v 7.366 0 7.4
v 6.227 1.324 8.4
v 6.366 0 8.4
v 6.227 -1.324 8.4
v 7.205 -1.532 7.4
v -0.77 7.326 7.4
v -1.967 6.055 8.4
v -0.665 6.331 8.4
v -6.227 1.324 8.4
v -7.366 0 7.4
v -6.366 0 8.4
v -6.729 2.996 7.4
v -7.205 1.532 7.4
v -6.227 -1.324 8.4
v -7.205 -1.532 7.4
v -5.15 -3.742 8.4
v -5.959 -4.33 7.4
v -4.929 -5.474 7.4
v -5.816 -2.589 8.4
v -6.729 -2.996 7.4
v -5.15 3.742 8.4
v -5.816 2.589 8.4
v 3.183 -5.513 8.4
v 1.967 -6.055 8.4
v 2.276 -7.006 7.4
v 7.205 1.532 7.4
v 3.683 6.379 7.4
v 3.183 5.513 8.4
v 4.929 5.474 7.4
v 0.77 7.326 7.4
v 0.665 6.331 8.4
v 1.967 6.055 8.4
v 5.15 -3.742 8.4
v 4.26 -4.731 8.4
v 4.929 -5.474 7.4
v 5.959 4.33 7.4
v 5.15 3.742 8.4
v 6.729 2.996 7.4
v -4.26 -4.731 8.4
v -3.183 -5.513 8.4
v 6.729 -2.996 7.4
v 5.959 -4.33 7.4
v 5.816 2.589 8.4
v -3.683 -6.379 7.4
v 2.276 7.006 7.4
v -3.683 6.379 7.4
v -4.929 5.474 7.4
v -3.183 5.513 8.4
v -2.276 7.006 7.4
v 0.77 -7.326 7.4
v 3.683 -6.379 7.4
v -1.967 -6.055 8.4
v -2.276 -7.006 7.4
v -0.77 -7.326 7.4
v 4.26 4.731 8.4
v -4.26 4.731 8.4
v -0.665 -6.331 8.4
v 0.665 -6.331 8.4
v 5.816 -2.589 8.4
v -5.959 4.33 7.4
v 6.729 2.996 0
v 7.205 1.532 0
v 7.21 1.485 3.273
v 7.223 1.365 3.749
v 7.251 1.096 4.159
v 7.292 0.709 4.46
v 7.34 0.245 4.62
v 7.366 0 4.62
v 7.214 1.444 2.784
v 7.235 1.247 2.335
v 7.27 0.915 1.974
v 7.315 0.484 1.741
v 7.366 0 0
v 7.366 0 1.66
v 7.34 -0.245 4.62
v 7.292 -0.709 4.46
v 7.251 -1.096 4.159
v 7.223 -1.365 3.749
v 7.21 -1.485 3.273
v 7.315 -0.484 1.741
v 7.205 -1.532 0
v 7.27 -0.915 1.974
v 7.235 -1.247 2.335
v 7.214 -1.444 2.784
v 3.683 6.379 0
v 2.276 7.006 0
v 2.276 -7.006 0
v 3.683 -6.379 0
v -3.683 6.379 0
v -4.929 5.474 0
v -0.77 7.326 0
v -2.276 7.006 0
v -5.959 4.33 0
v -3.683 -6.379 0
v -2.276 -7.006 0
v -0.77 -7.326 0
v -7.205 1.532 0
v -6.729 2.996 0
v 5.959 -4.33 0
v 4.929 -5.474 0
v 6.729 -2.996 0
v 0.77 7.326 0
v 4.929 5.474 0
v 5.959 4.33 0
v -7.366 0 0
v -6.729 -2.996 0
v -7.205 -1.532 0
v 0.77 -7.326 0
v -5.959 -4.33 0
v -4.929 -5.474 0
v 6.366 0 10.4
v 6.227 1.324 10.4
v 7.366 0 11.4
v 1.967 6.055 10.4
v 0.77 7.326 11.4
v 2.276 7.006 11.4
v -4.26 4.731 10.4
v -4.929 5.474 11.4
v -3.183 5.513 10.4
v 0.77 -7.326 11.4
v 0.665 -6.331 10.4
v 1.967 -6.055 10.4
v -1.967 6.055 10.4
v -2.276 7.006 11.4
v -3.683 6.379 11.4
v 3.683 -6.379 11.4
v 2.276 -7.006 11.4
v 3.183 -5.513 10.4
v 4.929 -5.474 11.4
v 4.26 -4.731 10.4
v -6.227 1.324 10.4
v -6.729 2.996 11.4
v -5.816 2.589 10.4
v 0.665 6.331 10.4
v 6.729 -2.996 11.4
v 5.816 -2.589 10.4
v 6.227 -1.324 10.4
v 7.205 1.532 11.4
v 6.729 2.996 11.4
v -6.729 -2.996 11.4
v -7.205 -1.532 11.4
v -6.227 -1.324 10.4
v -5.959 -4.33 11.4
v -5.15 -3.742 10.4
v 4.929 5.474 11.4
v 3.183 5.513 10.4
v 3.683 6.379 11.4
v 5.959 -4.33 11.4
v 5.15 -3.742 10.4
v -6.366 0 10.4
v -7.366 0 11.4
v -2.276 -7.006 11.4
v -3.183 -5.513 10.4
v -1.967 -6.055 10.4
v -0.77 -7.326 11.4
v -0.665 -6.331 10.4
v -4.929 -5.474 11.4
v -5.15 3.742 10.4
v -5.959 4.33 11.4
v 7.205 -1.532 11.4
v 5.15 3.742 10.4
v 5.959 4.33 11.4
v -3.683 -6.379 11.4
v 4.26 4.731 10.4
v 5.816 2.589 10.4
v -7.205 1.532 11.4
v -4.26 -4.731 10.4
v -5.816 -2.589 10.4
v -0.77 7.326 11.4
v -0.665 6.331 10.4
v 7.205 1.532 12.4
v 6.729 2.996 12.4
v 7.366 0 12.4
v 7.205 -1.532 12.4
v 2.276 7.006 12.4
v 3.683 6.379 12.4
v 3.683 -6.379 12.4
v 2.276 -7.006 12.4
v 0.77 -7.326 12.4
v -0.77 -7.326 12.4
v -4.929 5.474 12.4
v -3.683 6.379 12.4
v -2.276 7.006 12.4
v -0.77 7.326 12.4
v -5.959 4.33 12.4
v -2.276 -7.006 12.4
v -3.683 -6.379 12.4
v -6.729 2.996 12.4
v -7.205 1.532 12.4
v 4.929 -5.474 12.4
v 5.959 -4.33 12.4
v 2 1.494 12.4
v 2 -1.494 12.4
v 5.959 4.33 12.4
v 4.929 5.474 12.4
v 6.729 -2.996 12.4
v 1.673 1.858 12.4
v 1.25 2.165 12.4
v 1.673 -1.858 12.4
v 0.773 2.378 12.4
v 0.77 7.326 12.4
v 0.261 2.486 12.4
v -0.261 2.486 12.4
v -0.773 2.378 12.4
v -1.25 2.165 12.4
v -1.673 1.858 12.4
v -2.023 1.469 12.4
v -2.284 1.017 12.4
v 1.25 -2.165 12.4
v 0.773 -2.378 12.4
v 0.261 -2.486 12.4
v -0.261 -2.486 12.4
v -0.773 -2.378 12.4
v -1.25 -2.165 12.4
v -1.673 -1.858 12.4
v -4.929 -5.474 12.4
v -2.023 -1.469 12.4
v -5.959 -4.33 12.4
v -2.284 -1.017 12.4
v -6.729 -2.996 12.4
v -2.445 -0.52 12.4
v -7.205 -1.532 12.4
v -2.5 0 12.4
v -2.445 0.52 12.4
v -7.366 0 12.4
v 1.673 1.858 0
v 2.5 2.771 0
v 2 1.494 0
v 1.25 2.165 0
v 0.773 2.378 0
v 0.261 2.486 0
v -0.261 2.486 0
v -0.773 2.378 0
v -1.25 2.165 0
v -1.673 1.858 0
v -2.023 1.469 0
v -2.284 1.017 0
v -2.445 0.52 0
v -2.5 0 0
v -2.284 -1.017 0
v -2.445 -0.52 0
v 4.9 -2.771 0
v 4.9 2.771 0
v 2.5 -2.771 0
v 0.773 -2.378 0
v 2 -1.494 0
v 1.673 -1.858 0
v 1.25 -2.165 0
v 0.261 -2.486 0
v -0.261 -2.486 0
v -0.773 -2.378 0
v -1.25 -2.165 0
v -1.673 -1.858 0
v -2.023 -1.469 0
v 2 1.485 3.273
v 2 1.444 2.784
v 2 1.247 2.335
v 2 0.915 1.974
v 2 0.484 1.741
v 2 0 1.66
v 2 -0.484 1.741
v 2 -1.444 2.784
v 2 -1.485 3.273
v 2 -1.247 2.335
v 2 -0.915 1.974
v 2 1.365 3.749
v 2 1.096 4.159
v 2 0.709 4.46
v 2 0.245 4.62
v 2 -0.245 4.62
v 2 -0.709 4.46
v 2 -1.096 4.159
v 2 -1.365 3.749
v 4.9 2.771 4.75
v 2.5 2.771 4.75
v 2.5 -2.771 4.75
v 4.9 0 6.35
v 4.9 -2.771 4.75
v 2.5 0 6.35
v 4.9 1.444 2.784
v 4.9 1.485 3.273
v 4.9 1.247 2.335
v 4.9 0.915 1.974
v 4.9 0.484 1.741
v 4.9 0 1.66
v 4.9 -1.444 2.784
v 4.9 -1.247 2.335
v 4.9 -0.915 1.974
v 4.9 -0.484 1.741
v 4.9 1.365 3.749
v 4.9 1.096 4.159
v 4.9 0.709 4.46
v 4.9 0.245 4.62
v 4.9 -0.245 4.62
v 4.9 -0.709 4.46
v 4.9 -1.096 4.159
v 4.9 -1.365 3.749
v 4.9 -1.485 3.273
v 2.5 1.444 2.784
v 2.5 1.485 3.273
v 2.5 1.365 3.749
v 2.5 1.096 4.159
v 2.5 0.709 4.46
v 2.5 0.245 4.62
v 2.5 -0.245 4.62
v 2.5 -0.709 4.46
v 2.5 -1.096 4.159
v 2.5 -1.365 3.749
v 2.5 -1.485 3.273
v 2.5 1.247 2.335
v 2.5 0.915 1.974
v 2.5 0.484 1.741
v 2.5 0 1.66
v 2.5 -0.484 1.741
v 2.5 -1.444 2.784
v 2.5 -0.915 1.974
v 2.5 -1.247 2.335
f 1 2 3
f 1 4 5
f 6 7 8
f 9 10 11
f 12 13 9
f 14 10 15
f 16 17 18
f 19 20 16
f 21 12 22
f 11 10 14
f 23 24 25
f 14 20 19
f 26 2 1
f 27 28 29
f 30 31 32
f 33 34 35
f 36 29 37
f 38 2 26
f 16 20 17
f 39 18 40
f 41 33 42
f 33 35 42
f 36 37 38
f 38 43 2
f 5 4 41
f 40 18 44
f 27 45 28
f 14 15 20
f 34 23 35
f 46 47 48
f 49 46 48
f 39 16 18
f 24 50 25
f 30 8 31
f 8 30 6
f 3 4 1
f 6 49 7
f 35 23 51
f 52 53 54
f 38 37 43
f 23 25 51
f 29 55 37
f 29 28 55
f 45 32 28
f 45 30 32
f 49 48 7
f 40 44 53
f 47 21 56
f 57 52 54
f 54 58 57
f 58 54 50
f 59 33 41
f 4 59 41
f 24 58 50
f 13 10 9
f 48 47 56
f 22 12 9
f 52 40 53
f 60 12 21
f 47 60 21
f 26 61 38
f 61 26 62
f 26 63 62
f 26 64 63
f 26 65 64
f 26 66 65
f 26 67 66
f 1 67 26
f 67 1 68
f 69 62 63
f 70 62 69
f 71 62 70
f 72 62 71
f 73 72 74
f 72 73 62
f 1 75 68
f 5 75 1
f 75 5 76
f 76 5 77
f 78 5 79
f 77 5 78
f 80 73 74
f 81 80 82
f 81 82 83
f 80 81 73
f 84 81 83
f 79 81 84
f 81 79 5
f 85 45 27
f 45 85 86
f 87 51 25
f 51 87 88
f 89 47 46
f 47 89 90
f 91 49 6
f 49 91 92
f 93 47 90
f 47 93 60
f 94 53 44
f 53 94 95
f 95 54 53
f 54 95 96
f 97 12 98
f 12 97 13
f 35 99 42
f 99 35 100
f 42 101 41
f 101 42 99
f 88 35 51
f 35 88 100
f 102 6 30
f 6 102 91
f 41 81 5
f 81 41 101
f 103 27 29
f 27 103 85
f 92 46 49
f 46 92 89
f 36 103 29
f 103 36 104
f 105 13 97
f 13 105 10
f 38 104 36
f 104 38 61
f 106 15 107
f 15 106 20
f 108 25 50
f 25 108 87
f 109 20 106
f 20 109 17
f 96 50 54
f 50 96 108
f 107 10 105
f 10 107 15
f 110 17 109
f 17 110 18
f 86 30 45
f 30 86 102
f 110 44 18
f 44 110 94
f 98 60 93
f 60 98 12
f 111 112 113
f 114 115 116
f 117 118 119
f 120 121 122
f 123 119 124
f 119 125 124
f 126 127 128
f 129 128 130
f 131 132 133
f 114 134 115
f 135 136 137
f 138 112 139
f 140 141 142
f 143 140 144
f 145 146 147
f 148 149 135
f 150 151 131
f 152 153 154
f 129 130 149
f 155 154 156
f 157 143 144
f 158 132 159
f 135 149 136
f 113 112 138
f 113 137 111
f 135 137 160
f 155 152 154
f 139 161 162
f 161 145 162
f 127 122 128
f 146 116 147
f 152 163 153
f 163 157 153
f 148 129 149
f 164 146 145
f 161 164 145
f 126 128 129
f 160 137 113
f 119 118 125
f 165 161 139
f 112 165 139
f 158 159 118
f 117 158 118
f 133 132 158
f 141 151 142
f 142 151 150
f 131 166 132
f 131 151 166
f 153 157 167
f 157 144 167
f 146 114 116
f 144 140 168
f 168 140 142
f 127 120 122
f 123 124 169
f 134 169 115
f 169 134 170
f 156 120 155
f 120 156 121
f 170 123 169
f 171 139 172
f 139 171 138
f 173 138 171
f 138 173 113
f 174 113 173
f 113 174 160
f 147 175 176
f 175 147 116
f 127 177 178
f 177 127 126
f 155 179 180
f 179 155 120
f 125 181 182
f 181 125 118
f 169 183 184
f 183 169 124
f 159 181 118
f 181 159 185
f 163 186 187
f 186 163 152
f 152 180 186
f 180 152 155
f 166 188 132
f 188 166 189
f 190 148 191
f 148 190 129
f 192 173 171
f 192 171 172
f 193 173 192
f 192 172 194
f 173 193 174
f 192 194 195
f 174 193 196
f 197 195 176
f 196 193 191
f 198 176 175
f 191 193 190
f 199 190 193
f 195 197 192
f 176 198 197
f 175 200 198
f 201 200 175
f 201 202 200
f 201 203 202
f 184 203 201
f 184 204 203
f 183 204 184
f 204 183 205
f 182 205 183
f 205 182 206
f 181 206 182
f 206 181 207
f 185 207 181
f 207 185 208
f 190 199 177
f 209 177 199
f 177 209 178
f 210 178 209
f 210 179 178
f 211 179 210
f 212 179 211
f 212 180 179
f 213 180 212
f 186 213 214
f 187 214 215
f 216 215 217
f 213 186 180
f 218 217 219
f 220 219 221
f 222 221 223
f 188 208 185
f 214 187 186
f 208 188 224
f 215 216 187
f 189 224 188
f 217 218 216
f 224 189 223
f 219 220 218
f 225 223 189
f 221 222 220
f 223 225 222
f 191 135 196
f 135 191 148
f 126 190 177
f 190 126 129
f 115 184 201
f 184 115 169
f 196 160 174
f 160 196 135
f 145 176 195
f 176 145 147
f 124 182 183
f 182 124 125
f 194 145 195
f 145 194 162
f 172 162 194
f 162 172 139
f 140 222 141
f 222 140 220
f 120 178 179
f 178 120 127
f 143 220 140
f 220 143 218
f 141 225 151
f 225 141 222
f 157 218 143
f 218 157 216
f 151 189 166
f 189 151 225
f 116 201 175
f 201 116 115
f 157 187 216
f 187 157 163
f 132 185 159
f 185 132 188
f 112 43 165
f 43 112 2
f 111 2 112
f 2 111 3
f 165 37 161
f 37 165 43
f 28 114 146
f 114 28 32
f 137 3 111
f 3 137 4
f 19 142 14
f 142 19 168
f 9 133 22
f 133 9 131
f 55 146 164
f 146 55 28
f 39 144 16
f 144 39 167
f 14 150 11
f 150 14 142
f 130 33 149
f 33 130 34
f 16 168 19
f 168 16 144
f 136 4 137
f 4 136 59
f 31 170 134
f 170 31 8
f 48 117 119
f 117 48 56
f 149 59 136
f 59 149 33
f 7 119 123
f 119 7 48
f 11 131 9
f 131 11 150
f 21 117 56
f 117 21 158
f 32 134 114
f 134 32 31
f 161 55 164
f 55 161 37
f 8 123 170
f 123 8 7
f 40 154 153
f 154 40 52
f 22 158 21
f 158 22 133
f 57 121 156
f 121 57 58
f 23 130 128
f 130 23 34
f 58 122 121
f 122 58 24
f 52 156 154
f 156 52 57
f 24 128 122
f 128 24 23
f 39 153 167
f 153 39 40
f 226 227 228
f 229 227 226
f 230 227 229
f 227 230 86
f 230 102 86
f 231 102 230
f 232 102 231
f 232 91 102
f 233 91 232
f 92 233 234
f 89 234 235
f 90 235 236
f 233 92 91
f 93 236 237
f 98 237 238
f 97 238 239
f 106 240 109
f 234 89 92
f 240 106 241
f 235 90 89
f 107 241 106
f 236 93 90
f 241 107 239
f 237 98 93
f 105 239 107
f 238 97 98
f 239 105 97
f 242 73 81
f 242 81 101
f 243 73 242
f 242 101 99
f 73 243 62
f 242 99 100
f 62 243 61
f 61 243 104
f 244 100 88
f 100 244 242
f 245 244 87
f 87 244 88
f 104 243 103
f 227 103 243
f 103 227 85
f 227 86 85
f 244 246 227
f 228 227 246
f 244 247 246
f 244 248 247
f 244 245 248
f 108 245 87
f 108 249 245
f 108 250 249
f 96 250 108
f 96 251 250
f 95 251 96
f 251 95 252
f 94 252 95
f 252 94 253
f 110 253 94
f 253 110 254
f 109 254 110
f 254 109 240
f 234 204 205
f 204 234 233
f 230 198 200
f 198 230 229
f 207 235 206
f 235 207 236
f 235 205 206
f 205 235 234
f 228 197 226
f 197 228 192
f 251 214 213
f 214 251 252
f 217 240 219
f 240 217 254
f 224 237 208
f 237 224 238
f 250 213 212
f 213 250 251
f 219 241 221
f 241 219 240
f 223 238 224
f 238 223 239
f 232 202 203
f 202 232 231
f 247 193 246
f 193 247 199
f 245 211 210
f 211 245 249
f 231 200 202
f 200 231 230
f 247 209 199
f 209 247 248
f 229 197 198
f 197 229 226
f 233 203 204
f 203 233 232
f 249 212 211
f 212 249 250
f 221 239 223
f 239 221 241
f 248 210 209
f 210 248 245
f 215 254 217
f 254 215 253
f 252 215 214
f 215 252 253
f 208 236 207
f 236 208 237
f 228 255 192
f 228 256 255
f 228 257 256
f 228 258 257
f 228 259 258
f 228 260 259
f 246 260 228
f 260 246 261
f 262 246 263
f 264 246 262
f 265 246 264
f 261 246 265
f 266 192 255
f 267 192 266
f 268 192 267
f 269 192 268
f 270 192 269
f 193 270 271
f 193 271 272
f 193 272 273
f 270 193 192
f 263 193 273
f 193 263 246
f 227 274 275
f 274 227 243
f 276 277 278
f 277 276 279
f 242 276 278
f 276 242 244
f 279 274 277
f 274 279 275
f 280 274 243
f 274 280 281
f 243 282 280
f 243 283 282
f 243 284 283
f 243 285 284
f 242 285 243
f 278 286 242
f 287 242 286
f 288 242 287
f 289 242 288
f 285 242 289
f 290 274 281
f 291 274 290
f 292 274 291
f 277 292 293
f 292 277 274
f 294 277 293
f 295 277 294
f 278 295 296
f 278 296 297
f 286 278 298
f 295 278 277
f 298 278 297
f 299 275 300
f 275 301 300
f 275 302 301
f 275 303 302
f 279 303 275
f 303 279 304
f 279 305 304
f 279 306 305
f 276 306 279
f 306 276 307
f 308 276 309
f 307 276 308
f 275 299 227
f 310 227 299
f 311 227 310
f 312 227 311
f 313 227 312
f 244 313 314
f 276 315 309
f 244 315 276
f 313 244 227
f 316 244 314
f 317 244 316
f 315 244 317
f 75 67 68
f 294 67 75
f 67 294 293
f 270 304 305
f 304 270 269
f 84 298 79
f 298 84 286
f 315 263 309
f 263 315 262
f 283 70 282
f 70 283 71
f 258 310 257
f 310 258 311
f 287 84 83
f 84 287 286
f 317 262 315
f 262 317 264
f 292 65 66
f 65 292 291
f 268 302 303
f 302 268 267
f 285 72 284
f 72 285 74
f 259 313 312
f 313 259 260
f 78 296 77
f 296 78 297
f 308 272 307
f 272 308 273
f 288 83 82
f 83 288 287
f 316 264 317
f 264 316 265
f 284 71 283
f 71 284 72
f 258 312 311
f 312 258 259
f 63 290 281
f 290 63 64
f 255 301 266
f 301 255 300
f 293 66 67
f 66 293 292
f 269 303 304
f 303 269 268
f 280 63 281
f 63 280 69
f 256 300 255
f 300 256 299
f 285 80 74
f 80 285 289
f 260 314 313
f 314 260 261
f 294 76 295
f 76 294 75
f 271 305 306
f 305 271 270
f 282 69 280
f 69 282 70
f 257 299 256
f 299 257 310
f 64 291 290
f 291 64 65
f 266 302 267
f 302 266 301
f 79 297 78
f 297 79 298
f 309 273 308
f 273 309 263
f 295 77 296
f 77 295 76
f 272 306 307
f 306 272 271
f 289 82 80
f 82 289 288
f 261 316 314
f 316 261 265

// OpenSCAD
// file: math.scad
// pulley
pulley_length = pulley_h+4*pulley_rivet+NUT_D[3];
pulley_diameter = pulley_d+pulley_rivet*2;
pulley_wire_height = pulley_h/2+pulley_rivet*2+NUT_D[3];
pulley_screw_length = (pulley_diameter-NEMA_S[17])/2;

//y
y_shaft_distance = NEMA_F[ab_motor]+y_s+y_shaft_distance_extra;

//
x_shaft_distance = y_shaft_distance-y_d-y_s;

//echo(x_shaft_distance);
// file: config.scad
include <standard.scad>


//render & print
$fs=.5;						//minimum arc segment
e=.1;						//extra length for manfold mesh (do not change)
tol=.5;						//xy compensation for small holes

wall=5/2;					//thin wall thickness

//frame
f_t=10;						//frame thickness
f_x=200;
f_y=200;
f_z=65;
f_tr=8;						//corner threaded rods ISO diameter 
fy_ko=2;					//keepout between frame and x_carriage

//microswitch
ms_h=6;						//height
ms_l=13;					//length
ms_t=6;						//thickness

//motors
ab_motor=17;				//xy motors
ab_motor_l=47;				//xy motors length
z_motor=17;					//z motor
z_motor_l=47;				//z motor length

//x
x_d=15;						//bearing diameter
x_l=24;						//bearing length
x_s=8;						//shaft diameter
x_fan=30;					//hotend fan diameter
x_blower=35;				//blower fan diameter
x_fans_m=6;					//fan and blower mount holes spacing

x_fan_duct=28;
x_blower_duct=25;
x_shroud=10;
x_shroud_t=5;
x_shroud_w=2;


//y
y_d=15;						//bearing diameter
y_l=24;						//bearing length
y_s=8;						//shaft diameter
y_shaft_distance_extra=3;	//extra distance between shafts
y_sp=6;						//shaft position (relative to frame)

//idler
idler_d=8;					//groove bearing OD
idler_l=3;					//groove bearing thickness
idler_s=3;					//groove bearing ID

idler_hk=2;					//idler horizontal keepout
idler_vk=.5;				//idler verical keepout (washer thickness?)

//pulley
pulley_d=200/PI/5;			//5 steps per mm (80 with 16x microstepping)
pulley_h=2;
pulley_rivet=1;
pulley_flat_shaft=true;

//hm (hotend mount)
//hm_sc_d=3+0.4*3*2;			//sliding cylinder diameter (optimized for 0.4mm nozzle)
hm_sc_d=NUT_D[3];


include <math.scad>
// file: standard.scad
BOLT_D = [
	-1, //0 index is not used but reduces computation
	-1,
	-1,
	2.980,	//m3
	3.978,	//m4
	4.976,	//m5
	5.974,	//m6
	-1,
	7.972,	//m8
	-1,
	9.968,	//m10
	-1,
	11.966	//m12
];

NUT_D = [
	-1, //0 index is not used but reduces computation
	-1,
	-1,
	6.40,	//m3
	8.10,	//m4
	9.20,	//m5
	11.50,	//m6
	-1,
	15.00,	//m8
	-1,
	19.60,	//m10
	-1,
	22.10	//m12
];

NUT_H = [
	-1, //0 index is not used but reduces computation
	-1,
	-1,
	2.40,	//m3
	3.20,	//m4
	4.00,	//m5
	5.00,	//m6
	-1,
	6.50,	//m8
	-1,
	8.00,	//m10
	-1,
	10.00	//m12
];

NEMA_F = [	//faceplate size
	-1,-1,-1,-1,-1,-1,-1,-1,-1,-1,-1,
	28.0,	//Nema11
	-1,-1,
	35.6,	//Nema14
	-1,-1,
	42.3,	//Nema17
	-1,-1,-1,-1,-1,
	58.4	//Nema23
];

NEMA_H = [	//halved distance between holes
	-1,-1,-1,-1,-1,-1,-1,-1,-1,-1,-1,
	11.50,	//Nema11
	-1,-1,
	13.00,	//Nema14
	-1,-1,
	15.50,	//Nema17
	-1,-1,-1,-1,-1,
	23.57	//Nema23
];

NEMA_S = [	//shaft diameter
	-1,-1,-1,-1,-1,-1,-1,-1,-1,-1,-1,
	4.0,	//Nema11
	-1,-1,
	5.0,	//Nema14
	-1,-1,
	5.0,	//Nema17
	-1,-1,-1,-1,-1,
	6.35	//Nema23
];
// main file
include <standard.scad>		//size of standard components
include <config.scad>		//user configuration
include <math.scad>			//calculations

translate([0,0,pulley_wire_height])

difference() {

	union() {
	
		cylinder(d=pulley_d, h=pulley_h, center=true);
		for (i=[-1,1]) 
			translate([0,0,pulley_h+pulley_rivet]/2*i) {
				scale([1,1,i])
					cylinder(d1=pulley_d, d2=pulley_diameter, h=pulley_rivet, center=true);
				translate([0,0,pulley_rivet]*i)
					cylinder(d=pulley_diameter, h=pulley_rivet, center=true);
			}

		translate([0,0,pulley_h+4*pulley_rivet]/-2)	scale([1,1,-1])
			cylinder(d=pulley_diameter, h=NUT_D[3]);
	
	}
	
	translate(-[0,0,pulley_h/2+pulley_rivet*2+NUT_D[3]+e/2]) {
		difference() {
			cylinder(d=NEMA_S[ab_motor], h=pulley_length+e);
			if (pulley_flat_shaft)
				translate([NEMA_S[ab_motor]/2-.5, -NEMA_S[ab_motor]/2, 0])
					cube([NEMA_S[ab_motor], NEMA_S[ab_motor], pulley_length+e]);
		}
	
		hull()
			for(i=[0,1])
				translate([NEMA_S[ab_motor]/2,0,NUT_D[3]/2*i])
					rotate([0,90,0])
						cylinder(d=NUT_D[3], h=NUT_H[3], $fn=6);
		
		translate([0,0,NUT_D[3]/2])
			rotate([0,90,0])
				cylinder(d=BOLT_D[3], h=pulley_diameter/2+e);
	}
}
